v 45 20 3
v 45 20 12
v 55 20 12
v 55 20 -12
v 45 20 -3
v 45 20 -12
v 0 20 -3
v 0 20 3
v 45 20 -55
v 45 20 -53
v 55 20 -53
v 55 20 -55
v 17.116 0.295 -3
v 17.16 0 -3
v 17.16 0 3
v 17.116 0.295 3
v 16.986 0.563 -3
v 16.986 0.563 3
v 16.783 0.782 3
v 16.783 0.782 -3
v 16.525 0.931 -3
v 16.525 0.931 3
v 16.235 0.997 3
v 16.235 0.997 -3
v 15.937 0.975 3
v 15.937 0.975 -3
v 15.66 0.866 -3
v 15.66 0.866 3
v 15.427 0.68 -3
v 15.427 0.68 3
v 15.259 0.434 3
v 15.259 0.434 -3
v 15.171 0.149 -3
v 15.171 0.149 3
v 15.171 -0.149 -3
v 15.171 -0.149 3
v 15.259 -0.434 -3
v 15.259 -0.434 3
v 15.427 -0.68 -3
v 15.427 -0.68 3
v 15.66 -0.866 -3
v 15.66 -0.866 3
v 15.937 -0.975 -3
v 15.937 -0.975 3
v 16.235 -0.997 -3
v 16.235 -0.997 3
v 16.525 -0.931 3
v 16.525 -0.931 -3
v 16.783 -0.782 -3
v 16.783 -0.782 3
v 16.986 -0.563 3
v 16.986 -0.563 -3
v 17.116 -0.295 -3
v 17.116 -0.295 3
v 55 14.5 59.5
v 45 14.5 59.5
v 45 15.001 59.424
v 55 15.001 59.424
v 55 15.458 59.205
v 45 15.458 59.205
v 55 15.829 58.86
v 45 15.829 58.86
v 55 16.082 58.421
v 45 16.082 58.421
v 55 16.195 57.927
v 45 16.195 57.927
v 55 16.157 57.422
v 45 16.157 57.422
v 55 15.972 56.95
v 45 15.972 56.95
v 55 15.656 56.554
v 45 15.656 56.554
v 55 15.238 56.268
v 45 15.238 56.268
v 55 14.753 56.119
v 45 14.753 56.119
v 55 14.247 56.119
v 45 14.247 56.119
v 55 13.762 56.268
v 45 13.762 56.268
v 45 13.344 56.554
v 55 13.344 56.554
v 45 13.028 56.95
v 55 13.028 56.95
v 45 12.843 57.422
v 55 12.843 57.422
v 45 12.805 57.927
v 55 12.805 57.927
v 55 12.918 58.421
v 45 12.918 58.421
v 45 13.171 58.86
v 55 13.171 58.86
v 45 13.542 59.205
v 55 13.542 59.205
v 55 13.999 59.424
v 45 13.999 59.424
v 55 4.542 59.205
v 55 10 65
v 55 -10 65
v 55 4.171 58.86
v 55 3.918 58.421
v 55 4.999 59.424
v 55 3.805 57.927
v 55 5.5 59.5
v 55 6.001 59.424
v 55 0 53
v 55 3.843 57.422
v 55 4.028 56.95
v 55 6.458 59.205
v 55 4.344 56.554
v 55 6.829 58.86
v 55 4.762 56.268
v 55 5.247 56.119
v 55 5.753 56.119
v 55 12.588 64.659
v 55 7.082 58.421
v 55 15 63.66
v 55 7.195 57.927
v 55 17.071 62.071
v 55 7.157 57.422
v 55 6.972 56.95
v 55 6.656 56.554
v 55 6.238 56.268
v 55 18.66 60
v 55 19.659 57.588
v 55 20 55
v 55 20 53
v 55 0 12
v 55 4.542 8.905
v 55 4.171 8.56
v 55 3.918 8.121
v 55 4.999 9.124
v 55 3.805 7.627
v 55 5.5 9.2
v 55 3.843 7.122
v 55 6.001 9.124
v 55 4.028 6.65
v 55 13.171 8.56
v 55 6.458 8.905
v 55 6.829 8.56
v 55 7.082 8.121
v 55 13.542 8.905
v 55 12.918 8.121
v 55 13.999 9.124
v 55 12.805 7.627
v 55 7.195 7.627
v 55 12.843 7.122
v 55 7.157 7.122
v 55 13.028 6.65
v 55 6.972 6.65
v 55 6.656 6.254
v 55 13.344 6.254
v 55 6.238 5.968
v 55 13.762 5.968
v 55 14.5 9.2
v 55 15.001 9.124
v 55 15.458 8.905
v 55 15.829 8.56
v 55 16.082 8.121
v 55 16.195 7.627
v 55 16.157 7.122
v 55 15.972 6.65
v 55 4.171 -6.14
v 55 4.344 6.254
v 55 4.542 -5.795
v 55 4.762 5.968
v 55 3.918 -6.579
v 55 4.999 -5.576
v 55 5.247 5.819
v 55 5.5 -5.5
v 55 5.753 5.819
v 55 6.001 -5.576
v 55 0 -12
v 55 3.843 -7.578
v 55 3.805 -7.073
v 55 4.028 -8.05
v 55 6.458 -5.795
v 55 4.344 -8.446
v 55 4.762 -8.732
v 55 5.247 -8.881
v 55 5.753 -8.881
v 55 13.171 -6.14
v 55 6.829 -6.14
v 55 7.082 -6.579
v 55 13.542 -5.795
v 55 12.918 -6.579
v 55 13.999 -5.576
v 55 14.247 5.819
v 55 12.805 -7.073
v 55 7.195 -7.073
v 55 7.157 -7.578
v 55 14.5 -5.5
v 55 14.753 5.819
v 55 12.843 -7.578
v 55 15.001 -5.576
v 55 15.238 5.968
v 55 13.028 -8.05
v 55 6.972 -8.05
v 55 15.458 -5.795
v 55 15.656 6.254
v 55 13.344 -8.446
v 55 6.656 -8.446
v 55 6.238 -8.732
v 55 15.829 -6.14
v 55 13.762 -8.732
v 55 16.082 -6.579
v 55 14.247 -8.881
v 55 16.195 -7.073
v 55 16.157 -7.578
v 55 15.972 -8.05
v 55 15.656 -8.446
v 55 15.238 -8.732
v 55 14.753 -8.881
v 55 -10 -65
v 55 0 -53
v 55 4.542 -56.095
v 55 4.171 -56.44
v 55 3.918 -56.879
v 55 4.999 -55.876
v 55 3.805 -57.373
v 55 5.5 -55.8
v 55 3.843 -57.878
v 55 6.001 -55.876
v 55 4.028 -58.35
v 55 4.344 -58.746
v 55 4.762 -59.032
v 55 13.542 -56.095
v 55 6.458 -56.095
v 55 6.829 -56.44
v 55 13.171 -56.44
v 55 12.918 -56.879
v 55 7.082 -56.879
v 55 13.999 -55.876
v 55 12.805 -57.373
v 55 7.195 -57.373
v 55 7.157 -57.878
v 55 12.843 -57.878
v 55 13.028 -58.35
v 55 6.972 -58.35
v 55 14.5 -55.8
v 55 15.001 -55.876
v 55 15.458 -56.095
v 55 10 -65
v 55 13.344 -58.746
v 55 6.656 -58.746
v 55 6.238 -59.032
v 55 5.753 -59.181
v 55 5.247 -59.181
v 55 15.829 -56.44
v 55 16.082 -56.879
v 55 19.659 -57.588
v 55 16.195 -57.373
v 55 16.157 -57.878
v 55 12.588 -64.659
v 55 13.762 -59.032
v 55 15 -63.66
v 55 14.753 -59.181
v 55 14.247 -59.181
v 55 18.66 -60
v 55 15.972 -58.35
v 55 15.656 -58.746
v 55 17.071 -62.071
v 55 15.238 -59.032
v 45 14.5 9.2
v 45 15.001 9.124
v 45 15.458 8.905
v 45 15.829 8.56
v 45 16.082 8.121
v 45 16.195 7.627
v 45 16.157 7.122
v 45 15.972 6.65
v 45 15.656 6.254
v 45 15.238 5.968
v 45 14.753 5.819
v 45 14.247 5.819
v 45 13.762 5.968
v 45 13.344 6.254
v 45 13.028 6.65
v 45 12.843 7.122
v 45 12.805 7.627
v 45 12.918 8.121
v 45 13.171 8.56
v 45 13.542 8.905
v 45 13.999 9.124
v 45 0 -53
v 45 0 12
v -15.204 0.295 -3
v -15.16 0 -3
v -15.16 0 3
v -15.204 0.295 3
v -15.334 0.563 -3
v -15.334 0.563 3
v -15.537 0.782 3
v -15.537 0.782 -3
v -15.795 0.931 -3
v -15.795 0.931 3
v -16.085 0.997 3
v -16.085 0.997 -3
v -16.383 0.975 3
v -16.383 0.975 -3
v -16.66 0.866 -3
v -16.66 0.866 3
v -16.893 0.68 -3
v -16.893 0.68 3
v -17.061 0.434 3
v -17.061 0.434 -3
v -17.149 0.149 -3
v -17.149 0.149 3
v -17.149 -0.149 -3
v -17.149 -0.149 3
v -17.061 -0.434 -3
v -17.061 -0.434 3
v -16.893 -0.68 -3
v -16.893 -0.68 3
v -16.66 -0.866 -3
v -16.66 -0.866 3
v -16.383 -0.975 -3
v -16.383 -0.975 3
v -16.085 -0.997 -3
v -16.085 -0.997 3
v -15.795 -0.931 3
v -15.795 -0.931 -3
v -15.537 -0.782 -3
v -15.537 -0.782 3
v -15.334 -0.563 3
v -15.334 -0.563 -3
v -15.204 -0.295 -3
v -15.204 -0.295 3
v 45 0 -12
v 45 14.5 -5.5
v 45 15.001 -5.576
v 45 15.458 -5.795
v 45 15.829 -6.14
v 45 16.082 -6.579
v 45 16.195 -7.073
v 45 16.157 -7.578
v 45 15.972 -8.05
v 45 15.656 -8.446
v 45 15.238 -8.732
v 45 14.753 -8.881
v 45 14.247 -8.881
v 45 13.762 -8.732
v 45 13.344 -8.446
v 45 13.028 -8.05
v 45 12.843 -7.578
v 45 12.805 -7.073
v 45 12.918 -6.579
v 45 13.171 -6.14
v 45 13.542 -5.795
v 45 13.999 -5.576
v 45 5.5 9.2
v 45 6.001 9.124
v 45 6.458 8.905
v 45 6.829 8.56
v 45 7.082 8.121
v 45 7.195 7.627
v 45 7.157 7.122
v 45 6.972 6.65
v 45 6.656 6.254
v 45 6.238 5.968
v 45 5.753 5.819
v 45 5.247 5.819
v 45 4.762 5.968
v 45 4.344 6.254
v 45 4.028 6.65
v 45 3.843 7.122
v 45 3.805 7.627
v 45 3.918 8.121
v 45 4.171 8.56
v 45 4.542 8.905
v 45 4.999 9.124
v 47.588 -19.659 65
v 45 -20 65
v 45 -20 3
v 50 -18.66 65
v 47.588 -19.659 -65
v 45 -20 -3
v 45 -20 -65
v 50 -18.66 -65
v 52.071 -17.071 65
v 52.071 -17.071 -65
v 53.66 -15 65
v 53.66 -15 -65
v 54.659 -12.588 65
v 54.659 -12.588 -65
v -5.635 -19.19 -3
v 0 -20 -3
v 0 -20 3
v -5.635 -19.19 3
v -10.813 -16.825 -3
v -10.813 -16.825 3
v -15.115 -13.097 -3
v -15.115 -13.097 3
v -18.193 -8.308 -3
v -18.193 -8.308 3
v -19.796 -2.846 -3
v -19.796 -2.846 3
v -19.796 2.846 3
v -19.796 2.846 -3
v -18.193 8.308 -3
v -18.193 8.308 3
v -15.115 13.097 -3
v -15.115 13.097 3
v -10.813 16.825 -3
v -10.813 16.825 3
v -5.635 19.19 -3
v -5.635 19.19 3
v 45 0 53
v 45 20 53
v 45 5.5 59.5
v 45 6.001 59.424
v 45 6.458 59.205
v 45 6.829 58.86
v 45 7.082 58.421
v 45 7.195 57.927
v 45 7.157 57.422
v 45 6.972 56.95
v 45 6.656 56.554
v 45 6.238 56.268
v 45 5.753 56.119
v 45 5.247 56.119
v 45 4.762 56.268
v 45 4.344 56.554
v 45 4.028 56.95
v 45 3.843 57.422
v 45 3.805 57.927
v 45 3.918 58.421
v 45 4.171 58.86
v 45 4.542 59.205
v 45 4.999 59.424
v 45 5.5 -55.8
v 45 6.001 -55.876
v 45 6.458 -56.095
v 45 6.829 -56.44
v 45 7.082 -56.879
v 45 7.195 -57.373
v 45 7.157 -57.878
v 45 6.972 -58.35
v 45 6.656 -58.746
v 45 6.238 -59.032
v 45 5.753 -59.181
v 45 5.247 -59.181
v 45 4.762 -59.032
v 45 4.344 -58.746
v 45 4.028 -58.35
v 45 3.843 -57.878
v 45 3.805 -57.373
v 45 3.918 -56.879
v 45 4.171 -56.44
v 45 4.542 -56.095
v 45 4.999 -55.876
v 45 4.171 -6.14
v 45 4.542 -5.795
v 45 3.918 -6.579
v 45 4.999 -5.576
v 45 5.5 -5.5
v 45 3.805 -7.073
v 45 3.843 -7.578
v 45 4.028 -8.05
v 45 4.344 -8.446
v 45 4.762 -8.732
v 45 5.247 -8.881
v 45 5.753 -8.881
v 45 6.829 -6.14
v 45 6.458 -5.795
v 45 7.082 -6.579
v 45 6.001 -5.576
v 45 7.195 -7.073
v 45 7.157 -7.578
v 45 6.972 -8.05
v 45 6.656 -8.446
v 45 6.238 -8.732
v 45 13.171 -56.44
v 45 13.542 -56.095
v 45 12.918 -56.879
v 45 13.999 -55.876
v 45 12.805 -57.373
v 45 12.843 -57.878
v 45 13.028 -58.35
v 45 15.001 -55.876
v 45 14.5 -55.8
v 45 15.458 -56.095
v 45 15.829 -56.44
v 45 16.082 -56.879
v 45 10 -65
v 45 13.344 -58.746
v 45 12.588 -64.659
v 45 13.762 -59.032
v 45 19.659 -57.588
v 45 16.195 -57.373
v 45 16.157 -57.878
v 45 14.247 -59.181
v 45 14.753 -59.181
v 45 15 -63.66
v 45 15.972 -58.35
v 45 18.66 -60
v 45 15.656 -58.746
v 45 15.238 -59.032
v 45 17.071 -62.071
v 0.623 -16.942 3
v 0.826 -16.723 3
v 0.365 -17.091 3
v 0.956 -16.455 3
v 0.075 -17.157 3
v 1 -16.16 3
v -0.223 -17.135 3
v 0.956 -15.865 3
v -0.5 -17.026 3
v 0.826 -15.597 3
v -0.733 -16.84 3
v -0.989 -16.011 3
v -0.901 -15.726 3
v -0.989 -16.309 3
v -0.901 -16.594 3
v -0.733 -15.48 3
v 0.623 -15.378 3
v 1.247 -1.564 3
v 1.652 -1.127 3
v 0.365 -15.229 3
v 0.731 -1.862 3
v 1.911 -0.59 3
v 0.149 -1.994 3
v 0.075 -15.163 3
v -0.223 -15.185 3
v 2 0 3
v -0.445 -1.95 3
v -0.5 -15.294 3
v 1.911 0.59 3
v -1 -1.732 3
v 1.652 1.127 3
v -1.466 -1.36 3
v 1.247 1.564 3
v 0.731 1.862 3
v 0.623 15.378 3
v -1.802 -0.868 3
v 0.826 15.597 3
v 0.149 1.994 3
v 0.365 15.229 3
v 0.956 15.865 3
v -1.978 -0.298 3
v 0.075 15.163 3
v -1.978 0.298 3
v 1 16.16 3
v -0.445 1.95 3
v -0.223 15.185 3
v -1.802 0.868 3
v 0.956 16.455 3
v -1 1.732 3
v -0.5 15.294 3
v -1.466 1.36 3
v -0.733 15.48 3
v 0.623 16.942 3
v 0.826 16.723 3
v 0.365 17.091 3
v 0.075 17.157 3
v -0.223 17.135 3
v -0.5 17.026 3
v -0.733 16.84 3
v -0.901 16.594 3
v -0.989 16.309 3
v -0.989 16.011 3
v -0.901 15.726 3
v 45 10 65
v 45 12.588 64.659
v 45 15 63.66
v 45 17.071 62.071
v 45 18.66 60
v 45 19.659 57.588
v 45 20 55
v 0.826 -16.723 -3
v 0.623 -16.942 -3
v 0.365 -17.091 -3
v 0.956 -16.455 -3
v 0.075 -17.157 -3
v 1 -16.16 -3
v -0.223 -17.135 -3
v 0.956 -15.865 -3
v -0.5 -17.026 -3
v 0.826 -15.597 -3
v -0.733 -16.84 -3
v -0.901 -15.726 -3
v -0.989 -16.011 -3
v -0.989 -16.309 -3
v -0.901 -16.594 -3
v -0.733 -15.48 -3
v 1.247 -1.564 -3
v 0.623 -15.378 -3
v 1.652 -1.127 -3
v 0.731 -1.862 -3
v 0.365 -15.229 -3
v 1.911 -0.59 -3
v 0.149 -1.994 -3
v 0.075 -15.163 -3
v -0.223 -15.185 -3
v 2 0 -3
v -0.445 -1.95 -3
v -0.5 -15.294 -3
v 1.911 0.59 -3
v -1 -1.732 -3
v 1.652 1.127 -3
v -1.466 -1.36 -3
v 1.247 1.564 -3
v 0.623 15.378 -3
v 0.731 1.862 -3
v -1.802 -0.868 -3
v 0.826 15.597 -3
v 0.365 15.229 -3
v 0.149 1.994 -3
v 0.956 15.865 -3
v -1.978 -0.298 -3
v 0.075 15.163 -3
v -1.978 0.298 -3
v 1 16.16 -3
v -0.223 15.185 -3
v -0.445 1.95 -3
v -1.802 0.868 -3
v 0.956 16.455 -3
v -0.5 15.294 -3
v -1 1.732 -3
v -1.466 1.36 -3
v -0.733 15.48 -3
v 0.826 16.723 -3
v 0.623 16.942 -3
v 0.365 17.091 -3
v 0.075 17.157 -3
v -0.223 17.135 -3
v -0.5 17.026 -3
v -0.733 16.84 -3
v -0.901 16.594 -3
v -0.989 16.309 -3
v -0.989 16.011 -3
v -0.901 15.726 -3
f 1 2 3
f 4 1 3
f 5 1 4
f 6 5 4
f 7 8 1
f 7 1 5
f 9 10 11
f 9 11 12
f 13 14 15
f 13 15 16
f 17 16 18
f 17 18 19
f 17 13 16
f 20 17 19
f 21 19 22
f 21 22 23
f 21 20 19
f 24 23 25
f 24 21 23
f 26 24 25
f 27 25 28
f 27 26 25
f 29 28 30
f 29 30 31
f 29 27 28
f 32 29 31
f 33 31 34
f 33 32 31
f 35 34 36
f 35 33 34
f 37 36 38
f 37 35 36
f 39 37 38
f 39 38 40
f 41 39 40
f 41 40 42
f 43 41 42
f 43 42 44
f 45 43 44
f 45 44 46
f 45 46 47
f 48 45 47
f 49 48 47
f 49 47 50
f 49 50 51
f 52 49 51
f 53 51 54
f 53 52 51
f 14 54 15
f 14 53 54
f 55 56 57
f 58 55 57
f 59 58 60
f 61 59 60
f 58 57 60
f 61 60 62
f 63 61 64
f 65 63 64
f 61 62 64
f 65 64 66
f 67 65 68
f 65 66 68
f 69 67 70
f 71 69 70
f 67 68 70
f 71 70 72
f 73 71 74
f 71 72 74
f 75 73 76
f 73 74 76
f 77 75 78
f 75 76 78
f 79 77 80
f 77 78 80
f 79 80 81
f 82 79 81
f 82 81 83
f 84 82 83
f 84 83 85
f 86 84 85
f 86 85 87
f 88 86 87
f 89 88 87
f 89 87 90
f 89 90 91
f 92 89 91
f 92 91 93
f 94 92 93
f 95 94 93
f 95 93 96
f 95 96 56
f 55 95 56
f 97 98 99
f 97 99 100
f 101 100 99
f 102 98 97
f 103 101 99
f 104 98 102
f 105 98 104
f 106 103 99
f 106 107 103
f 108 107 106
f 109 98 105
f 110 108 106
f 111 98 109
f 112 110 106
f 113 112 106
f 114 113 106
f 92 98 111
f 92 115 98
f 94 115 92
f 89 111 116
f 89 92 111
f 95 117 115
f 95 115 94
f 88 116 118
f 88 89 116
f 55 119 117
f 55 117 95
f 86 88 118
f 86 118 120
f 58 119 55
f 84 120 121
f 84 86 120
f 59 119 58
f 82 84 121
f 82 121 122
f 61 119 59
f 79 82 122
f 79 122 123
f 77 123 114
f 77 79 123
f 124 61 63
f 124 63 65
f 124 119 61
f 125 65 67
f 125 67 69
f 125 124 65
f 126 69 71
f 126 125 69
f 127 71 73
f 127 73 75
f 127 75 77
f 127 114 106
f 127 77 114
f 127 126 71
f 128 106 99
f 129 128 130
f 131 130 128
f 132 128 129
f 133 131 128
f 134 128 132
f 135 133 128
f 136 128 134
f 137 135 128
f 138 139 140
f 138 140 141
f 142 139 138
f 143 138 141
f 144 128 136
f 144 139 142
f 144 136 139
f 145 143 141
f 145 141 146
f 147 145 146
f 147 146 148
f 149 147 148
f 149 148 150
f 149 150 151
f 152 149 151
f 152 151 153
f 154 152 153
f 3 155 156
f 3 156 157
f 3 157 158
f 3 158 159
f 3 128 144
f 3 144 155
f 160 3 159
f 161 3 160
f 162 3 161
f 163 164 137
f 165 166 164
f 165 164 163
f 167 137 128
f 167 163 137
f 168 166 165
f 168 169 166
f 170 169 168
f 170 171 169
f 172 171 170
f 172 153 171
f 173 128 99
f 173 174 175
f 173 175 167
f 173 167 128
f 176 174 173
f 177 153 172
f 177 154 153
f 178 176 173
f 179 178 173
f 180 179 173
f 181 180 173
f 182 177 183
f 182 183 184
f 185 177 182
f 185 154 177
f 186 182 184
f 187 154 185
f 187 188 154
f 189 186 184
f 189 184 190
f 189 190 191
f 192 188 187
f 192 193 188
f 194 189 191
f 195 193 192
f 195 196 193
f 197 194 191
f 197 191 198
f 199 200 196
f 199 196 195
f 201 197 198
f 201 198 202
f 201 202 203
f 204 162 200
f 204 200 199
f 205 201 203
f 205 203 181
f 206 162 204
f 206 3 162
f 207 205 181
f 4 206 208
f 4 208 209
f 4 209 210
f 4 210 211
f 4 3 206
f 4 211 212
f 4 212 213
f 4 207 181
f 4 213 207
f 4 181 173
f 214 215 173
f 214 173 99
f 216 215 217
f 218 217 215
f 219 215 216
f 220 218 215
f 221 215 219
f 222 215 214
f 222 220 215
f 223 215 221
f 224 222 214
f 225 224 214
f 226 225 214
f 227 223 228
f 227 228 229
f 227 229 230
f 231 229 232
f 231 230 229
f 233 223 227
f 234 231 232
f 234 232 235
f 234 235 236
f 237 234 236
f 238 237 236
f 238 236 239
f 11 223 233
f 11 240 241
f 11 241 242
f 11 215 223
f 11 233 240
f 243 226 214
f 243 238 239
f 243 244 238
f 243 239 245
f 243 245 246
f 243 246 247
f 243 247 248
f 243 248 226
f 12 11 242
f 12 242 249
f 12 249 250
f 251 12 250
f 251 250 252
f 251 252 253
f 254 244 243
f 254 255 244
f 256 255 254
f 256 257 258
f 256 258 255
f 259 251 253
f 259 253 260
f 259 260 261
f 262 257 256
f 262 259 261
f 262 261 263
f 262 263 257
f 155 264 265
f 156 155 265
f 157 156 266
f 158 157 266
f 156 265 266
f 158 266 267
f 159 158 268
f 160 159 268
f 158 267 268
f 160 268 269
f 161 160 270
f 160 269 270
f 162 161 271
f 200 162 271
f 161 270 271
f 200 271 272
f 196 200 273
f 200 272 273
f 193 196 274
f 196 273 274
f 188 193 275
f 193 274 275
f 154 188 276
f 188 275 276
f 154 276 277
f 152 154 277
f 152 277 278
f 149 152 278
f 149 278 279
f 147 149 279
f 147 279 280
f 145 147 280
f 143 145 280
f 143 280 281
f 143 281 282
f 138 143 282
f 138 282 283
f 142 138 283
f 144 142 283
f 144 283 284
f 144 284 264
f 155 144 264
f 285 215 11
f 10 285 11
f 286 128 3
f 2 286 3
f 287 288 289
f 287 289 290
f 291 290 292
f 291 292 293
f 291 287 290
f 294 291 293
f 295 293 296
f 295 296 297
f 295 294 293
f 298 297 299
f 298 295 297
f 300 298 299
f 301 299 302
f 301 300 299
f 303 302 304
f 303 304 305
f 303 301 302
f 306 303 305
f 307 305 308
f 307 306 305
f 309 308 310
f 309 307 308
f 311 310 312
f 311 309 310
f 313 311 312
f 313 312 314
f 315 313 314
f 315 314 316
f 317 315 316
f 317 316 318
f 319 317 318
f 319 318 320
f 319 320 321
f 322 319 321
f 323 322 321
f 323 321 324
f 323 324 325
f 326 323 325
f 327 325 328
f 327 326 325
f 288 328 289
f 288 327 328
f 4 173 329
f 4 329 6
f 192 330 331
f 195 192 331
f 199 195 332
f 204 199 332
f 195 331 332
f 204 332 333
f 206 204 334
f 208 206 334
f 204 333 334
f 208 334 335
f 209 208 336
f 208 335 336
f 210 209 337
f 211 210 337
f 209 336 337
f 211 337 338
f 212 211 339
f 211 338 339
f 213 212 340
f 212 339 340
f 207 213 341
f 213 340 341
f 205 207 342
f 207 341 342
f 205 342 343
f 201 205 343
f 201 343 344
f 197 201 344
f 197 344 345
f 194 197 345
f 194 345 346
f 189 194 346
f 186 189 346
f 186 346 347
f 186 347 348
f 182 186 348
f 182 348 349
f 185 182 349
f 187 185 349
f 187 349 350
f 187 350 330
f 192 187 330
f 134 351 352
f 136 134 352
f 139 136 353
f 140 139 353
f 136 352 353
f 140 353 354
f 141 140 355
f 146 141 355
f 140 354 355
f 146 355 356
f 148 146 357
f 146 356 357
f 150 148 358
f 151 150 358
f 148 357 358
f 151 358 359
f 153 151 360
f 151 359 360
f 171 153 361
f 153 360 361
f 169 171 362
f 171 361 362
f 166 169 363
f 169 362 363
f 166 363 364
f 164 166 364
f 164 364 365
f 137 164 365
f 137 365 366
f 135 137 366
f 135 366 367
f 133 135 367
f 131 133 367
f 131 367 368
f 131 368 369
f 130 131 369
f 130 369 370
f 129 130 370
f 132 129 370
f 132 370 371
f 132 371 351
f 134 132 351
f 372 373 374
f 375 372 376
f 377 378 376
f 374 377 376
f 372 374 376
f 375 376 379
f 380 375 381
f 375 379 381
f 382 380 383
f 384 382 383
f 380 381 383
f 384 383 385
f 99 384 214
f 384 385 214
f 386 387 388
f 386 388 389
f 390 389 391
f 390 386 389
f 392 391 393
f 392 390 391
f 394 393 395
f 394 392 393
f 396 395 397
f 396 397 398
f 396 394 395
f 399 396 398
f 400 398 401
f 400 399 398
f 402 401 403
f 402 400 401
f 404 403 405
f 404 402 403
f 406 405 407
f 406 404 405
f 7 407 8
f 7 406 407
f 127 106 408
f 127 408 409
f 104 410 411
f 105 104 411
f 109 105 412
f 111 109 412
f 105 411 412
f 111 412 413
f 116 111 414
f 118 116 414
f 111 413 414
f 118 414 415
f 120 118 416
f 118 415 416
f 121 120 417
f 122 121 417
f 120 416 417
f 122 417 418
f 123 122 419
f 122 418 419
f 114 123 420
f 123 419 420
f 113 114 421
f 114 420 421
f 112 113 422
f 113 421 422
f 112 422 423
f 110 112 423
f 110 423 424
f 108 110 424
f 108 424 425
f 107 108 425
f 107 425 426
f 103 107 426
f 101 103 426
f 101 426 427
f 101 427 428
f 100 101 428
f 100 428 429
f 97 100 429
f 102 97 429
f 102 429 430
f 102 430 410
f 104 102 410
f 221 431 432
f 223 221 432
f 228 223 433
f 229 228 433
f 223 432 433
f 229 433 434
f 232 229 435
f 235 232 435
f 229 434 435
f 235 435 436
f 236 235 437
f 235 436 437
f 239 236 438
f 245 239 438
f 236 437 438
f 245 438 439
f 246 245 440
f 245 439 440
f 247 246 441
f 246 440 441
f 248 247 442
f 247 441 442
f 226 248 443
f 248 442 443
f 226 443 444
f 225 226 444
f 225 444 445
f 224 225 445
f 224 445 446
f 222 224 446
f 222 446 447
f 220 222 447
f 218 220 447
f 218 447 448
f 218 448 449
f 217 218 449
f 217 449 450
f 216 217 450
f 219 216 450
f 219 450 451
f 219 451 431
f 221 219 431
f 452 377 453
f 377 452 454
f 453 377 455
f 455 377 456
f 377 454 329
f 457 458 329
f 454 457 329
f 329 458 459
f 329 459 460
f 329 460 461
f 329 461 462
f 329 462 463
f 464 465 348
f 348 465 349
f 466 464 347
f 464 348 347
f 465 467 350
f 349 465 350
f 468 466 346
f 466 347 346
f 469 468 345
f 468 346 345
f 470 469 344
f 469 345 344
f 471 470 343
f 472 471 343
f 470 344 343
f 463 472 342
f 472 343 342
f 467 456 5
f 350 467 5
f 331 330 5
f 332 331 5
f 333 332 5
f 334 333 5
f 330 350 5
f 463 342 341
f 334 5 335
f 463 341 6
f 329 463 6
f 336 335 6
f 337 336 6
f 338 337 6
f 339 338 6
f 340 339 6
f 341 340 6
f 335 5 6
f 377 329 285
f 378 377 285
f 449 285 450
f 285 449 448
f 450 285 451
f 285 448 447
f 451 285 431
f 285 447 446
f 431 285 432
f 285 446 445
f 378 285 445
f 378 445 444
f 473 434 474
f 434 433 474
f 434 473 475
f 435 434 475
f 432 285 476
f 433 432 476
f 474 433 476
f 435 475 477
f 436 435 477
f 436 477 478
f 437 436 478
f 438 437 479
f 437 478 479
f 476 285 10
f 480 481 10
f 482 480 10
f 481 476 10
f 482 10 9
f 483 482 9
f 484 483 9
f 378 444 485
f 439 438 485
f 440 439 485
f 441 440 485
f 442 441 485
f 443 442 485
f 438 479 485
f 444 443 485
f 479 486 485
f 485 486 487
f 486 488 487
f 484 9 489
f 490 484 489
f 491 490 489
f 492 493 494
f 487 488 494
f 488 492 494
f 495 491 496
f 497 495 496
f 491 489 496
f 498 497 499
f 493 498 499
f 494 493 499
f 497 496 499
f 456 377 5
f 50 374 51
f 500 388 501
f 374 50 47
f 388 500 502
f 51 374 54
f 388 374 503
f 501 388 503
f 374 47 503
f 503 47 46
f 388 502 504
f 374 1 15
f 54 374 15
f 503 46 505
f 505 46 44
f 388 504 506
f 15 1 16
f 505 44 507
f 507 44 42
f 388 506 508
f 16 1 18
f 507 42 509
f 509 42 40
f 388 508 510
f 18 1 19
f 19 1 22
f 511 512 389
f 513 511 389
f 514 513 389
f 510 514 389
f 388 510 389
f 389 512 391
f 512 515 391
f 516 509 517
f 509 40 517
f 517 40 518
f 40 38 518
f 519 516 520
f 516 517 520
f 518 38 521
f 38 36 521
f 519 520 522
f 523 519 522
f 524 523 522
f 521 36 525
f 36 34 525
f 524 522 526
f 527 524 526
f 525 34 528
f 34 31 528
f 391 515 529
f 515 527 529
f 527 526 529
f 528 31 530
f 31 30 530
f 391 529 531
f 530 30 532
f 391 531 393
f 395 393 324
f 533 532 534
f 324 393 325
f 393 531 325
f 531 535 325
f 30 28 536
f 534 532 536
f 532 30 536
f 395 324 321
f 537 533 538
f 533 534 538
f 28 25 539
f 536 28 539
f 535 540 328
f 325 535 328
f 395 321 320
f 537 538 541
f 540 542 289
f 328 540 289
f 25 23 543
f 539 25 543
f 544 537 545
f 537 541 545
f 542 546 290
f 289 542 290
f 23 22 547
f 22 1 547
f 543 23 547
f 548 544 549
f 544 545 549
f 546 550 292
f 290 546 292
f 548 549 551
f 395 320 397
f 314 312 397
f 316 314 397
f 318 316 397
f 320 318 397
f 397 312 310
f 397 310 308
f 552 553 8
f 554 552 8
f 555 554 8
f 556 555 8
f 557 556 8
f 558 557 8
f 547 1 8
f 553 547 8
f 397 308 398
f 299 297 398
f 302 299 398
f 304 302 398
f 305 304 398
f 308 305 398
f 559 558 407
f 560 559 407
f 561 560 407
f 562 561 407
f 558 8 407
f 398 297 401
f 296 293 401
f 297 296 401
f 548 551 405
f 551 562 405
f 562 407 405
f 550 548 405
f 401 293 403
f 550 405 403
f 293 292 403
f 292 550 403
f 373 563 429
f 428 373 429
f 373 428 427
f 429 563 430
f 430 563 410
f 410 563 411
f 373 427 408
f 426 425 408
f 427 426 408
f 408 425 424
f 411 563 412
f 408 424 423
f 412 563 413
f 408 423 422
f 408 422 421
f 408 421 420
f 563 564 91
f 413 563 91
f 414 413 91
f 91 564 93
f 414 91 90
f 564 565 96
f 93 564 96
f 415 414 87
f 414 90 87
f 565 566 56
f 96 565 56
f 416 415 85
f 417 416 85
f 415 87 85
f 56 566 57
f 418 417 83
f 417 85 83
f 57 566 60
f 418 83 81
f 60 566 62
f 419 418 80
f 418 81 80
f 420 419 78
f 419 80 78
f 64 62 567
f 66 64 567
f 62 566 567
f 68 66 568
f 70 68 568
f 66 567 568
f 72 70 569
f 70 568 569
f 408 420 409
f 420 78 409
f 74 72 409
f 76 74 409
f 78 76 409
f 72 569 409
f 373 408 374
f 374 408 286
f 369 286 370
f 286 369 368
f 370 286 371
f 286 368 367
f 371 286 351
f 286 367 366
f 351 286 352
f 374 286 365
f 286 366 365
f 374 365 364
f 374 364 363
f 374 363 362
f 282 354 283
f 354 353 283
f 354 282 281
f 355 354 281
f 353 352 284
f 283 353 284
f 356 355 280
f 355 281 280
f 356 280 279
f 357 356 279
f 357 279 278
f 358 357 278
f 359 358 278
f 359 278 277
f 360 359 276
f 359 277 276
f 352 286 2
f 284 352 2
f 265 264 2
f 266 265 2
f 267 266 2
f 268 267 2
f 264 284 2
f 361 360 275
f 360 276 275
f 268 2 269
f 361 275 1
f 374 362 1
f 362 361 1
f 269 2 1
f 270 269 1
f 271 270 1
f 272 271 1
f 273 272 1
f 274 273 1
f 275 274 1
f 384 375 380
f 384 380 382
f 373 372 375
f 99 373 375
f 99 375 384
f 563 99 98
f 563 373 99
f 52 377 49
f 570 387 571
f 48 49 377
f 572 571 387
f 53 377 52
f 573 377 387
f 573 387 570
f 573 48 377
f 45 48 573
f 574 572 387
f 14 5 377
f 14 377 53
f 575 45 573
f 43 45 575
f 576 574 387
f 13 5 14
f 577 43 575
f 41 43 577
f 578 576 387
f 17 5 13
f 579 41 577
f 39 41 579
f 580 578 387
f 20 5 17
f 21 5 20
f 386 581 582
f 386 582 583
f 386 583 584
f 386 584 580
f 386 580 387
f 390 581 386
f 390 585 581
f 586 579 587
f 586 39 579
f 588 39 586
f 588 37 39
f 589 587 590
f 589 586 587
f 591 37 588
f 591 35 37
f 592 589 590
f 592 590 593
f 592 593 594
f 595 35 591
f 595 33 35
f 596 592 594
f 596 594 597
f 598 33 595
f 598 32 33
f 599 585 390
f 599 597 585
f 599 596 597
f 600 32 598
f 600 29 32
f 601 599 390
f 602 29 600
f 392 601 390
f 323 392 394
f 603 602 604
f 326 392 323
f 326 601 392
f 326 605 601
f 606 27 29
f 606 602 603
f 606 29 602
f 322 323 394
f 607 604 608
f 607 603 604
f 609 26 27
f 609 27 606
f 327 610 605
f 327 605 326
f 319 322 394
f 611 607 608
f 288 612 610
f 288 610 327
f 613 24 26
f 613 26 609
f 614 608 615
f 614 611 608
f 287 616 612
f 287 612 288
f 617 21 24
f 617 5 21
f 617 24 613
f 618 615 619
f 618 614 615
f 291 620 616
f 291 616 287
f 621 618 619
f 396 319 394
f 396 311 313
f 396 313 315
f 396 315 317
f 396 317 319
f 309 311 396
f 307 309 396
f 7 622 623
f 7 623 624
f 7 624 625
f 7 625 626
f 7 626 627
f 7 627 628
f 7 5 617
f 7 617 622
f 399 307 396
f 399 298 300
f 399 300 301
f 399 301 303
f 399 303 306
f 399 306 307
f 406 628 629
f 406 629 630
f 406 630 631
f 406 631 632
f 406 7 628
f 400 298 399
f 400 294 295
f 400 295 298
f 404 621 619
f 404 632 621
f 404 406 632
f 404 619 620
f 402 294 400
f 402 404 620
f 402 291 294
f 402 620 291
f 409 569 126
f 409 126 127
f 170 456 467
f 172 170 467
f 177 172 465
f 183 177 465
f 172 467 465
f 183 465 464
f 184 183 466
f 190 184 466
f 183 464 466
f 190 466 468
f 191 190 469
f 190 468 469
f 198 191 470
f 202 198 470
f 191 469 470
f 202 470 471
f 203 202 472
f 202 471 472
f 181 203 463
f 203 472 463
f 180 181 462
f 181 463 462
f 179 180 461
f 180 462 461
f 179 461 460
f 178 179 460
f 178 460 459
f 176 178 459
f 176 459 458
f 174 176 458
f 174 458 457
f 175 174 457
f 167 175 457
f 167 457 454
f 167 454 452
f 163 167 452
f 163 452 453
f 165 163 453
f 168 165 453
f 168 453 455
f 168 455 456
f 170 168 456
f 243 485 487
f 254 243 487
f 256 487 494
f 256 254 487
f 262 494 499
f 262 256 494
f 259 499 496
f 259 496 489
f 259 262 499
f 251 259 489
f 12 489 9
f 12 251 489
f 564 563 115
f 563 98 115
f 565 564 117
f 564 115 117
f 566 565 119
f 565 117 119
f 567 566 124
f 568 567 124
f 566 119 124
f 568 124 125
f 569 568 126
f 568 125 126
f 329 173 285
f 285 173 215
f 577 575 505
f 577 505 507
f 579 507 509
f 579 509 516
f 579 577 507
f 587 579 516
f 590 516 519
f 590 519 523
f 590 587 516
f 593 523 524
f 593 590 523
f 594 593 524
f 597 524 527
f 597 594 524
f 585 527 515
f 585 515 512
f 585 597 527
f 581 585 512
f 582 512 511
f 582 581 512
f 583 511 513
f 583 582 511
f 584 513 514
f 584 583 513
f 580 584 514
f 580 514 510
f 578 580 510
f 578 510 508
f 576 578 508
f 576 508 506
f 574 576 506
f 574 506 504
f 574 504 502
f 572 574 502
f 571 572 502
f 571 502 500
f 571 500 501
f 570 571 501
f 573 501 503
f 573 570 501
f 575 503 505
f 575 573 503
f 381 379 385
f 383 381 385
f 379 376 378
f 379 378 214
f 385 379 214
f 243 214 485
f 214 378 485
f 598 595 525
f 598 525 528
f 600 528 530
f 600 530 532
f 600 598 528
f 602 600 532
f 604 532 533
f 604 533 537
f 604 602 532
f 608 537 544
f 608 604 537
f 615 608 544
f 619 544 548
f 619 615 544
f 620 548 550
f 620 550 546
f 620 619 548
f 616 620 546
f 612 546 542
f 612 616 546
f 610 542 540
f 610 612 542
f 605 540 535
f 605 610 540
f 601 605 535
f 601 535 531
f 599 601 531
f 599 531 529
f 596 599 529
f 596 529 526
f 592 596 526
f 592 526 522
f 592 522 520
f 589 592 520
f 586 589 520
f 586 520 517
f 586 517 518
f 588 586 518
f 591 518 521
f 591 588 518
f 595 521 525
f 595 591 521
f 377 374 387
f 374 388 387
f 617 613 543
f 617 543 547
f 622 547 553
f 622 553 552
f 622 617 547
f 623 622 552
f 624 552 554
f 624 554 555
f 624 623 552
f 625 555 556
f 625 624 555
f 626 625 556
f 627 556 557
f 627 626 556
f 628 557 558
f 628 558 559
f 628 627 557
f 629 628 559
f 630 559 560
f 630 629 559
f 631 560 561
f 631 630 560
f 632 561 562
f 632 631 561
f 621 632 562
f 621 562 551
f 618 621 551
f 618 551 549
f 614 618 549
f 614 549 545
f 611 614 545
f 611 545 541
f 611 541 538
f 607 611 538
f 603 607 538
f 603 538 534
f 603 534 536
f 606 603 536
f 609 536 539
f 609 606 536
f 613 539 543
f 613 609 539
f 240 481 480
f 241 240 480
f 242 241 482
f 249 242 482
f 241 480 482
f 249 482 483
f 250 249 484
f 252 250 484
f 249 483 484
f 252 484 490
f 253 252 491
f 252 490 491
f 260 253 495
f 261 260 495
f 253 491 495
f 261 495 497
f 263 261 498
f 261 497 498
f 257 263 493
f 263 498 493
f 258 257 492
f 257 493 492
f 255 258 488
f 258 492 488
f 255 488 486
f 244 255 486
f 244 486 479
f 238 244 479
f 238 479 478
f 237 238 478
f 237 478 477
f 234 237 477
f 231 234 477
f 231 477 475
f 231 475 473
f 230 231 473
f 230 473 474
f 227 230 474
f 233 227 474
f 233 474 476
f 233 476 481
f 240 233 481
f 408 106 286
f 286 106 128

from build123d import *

# Parameters (mm, degrees)
EXTRUDE_1_DEPTH      = 3
EXTRUDE_1_DEPTH_BACK = 3
SKETCH_1_R           = 2
SKETCH_1_R_2         = 1
SKETCH_2_W           = 130
SKETCH_2_H           = 40
EXTRUDE_2_DEPTH      = 10
SKETCH_3_W           = 41
SKETCH_3_H           = 20
CUT_EXTRUDE_1_DEPTH  = 10
FILLET_1_R           = 10
HOLE_WIZARD_M3_1_D   = 3.4
FILLET_4_R           = 10


with BuildPart() as part:
    # 스케치1 → 보스-돌출1 (new, two sides: drawn at the far end of the back side and taken through both)
    with BuildSketch(Plane.XY.offset(-EXTRUDE_1_DEPTH_BACK)):
        with BuildLine():
            Line((0, 20), (45, 20))
            Line((45, 20), (45, -20))
            Line((45, -20), (0, -20))
            ThreePointArc((0, -20), (-20, 0), (0, 20))
        make_face()
        Circle(SKETCH_1_R, mode=Mode.SUBTRACT)
        with Locations((0, 16.16)):
            Circle(SKETCH_1_R_2, mode=Mode.SUBTRACT)
        with Locations((16.16, 0)):
            Circle(SKETCH_1_R_2, mode=Mode.SUBTRACT)
        with Locations((0, -16.16)):
            Circle(SKETCH_1_R_2, mode=Mode.SUBTRACT)
        with Locations((-16.16, 0)):
            Circle(SKETCH_1_R_2, mode=Mode.SUBTRACT)
    extrude(amount=EXTRUDE_1_DEPTH + EXTRUDE_1_DEPTH_BACK)

    # 스케치2 → 보스-돌출2 (add)
    with BuildSketch(Plane(origin=(45, 0, 0), x_dir=(0, 0, -1), z_dir=(1, 0, 0))):
        Rectangle(SKETCH_2_W, SKETCH_2_H)
    extrude(amount=EXTRUDE_2_DEPTH)

    # 스케치3 → 컷-돌출1 (cut)
    with BuildSketch(Plane(origin=(55, 0, 0), x_dir=(0, 0, -1), z_dir=(1, 0, 0))):
        with Locations((32.5, 10)):
            Rectangle(SKETCH_3_W, SKETCH_3_H)
        with Locations((-32.5, 10)):
            Rectangle(SKETCH_3_W, SKETCH_3_H)
    extrude(amount=-CUT_EXTRUDE_1_DEPTH, mode=Mode.SUBTRACT)

    # 필렛1
    fillet_1_edges = [part.edges().sort_by_distance(p)[0] for p in [
        (55, -20, 0),
    ]]
    fillet(fillet_1_edges, radius=FILLET_1_R)

    # M3 여유 구멍1 (through all)
    with Locations(Plane(origin=(55, 0, 0), x_dir=(0, 0, -1), z_dir=(1, 0, 0))):
        with Locations((-57.8, 14.5), (-57.8, 5.5), (-7.5, 14.5), (-7.5, 5.5), (7.2, 14.5), (7.2, 5.5), (57.5, 14.5), (57.5, 5.5)):
            Hole(HOLE_WIZARD_M3_1_D / 2)

    # 필렛4
    fillet_4_edges = [part.edges().sort_by_distance(p)[0] for p in [
        (50, 20, -65),
        (50, 20, 65),
    ]]
    fillet(fillet_4_edges, radius=FILLET_4_R)


solid = part.part
